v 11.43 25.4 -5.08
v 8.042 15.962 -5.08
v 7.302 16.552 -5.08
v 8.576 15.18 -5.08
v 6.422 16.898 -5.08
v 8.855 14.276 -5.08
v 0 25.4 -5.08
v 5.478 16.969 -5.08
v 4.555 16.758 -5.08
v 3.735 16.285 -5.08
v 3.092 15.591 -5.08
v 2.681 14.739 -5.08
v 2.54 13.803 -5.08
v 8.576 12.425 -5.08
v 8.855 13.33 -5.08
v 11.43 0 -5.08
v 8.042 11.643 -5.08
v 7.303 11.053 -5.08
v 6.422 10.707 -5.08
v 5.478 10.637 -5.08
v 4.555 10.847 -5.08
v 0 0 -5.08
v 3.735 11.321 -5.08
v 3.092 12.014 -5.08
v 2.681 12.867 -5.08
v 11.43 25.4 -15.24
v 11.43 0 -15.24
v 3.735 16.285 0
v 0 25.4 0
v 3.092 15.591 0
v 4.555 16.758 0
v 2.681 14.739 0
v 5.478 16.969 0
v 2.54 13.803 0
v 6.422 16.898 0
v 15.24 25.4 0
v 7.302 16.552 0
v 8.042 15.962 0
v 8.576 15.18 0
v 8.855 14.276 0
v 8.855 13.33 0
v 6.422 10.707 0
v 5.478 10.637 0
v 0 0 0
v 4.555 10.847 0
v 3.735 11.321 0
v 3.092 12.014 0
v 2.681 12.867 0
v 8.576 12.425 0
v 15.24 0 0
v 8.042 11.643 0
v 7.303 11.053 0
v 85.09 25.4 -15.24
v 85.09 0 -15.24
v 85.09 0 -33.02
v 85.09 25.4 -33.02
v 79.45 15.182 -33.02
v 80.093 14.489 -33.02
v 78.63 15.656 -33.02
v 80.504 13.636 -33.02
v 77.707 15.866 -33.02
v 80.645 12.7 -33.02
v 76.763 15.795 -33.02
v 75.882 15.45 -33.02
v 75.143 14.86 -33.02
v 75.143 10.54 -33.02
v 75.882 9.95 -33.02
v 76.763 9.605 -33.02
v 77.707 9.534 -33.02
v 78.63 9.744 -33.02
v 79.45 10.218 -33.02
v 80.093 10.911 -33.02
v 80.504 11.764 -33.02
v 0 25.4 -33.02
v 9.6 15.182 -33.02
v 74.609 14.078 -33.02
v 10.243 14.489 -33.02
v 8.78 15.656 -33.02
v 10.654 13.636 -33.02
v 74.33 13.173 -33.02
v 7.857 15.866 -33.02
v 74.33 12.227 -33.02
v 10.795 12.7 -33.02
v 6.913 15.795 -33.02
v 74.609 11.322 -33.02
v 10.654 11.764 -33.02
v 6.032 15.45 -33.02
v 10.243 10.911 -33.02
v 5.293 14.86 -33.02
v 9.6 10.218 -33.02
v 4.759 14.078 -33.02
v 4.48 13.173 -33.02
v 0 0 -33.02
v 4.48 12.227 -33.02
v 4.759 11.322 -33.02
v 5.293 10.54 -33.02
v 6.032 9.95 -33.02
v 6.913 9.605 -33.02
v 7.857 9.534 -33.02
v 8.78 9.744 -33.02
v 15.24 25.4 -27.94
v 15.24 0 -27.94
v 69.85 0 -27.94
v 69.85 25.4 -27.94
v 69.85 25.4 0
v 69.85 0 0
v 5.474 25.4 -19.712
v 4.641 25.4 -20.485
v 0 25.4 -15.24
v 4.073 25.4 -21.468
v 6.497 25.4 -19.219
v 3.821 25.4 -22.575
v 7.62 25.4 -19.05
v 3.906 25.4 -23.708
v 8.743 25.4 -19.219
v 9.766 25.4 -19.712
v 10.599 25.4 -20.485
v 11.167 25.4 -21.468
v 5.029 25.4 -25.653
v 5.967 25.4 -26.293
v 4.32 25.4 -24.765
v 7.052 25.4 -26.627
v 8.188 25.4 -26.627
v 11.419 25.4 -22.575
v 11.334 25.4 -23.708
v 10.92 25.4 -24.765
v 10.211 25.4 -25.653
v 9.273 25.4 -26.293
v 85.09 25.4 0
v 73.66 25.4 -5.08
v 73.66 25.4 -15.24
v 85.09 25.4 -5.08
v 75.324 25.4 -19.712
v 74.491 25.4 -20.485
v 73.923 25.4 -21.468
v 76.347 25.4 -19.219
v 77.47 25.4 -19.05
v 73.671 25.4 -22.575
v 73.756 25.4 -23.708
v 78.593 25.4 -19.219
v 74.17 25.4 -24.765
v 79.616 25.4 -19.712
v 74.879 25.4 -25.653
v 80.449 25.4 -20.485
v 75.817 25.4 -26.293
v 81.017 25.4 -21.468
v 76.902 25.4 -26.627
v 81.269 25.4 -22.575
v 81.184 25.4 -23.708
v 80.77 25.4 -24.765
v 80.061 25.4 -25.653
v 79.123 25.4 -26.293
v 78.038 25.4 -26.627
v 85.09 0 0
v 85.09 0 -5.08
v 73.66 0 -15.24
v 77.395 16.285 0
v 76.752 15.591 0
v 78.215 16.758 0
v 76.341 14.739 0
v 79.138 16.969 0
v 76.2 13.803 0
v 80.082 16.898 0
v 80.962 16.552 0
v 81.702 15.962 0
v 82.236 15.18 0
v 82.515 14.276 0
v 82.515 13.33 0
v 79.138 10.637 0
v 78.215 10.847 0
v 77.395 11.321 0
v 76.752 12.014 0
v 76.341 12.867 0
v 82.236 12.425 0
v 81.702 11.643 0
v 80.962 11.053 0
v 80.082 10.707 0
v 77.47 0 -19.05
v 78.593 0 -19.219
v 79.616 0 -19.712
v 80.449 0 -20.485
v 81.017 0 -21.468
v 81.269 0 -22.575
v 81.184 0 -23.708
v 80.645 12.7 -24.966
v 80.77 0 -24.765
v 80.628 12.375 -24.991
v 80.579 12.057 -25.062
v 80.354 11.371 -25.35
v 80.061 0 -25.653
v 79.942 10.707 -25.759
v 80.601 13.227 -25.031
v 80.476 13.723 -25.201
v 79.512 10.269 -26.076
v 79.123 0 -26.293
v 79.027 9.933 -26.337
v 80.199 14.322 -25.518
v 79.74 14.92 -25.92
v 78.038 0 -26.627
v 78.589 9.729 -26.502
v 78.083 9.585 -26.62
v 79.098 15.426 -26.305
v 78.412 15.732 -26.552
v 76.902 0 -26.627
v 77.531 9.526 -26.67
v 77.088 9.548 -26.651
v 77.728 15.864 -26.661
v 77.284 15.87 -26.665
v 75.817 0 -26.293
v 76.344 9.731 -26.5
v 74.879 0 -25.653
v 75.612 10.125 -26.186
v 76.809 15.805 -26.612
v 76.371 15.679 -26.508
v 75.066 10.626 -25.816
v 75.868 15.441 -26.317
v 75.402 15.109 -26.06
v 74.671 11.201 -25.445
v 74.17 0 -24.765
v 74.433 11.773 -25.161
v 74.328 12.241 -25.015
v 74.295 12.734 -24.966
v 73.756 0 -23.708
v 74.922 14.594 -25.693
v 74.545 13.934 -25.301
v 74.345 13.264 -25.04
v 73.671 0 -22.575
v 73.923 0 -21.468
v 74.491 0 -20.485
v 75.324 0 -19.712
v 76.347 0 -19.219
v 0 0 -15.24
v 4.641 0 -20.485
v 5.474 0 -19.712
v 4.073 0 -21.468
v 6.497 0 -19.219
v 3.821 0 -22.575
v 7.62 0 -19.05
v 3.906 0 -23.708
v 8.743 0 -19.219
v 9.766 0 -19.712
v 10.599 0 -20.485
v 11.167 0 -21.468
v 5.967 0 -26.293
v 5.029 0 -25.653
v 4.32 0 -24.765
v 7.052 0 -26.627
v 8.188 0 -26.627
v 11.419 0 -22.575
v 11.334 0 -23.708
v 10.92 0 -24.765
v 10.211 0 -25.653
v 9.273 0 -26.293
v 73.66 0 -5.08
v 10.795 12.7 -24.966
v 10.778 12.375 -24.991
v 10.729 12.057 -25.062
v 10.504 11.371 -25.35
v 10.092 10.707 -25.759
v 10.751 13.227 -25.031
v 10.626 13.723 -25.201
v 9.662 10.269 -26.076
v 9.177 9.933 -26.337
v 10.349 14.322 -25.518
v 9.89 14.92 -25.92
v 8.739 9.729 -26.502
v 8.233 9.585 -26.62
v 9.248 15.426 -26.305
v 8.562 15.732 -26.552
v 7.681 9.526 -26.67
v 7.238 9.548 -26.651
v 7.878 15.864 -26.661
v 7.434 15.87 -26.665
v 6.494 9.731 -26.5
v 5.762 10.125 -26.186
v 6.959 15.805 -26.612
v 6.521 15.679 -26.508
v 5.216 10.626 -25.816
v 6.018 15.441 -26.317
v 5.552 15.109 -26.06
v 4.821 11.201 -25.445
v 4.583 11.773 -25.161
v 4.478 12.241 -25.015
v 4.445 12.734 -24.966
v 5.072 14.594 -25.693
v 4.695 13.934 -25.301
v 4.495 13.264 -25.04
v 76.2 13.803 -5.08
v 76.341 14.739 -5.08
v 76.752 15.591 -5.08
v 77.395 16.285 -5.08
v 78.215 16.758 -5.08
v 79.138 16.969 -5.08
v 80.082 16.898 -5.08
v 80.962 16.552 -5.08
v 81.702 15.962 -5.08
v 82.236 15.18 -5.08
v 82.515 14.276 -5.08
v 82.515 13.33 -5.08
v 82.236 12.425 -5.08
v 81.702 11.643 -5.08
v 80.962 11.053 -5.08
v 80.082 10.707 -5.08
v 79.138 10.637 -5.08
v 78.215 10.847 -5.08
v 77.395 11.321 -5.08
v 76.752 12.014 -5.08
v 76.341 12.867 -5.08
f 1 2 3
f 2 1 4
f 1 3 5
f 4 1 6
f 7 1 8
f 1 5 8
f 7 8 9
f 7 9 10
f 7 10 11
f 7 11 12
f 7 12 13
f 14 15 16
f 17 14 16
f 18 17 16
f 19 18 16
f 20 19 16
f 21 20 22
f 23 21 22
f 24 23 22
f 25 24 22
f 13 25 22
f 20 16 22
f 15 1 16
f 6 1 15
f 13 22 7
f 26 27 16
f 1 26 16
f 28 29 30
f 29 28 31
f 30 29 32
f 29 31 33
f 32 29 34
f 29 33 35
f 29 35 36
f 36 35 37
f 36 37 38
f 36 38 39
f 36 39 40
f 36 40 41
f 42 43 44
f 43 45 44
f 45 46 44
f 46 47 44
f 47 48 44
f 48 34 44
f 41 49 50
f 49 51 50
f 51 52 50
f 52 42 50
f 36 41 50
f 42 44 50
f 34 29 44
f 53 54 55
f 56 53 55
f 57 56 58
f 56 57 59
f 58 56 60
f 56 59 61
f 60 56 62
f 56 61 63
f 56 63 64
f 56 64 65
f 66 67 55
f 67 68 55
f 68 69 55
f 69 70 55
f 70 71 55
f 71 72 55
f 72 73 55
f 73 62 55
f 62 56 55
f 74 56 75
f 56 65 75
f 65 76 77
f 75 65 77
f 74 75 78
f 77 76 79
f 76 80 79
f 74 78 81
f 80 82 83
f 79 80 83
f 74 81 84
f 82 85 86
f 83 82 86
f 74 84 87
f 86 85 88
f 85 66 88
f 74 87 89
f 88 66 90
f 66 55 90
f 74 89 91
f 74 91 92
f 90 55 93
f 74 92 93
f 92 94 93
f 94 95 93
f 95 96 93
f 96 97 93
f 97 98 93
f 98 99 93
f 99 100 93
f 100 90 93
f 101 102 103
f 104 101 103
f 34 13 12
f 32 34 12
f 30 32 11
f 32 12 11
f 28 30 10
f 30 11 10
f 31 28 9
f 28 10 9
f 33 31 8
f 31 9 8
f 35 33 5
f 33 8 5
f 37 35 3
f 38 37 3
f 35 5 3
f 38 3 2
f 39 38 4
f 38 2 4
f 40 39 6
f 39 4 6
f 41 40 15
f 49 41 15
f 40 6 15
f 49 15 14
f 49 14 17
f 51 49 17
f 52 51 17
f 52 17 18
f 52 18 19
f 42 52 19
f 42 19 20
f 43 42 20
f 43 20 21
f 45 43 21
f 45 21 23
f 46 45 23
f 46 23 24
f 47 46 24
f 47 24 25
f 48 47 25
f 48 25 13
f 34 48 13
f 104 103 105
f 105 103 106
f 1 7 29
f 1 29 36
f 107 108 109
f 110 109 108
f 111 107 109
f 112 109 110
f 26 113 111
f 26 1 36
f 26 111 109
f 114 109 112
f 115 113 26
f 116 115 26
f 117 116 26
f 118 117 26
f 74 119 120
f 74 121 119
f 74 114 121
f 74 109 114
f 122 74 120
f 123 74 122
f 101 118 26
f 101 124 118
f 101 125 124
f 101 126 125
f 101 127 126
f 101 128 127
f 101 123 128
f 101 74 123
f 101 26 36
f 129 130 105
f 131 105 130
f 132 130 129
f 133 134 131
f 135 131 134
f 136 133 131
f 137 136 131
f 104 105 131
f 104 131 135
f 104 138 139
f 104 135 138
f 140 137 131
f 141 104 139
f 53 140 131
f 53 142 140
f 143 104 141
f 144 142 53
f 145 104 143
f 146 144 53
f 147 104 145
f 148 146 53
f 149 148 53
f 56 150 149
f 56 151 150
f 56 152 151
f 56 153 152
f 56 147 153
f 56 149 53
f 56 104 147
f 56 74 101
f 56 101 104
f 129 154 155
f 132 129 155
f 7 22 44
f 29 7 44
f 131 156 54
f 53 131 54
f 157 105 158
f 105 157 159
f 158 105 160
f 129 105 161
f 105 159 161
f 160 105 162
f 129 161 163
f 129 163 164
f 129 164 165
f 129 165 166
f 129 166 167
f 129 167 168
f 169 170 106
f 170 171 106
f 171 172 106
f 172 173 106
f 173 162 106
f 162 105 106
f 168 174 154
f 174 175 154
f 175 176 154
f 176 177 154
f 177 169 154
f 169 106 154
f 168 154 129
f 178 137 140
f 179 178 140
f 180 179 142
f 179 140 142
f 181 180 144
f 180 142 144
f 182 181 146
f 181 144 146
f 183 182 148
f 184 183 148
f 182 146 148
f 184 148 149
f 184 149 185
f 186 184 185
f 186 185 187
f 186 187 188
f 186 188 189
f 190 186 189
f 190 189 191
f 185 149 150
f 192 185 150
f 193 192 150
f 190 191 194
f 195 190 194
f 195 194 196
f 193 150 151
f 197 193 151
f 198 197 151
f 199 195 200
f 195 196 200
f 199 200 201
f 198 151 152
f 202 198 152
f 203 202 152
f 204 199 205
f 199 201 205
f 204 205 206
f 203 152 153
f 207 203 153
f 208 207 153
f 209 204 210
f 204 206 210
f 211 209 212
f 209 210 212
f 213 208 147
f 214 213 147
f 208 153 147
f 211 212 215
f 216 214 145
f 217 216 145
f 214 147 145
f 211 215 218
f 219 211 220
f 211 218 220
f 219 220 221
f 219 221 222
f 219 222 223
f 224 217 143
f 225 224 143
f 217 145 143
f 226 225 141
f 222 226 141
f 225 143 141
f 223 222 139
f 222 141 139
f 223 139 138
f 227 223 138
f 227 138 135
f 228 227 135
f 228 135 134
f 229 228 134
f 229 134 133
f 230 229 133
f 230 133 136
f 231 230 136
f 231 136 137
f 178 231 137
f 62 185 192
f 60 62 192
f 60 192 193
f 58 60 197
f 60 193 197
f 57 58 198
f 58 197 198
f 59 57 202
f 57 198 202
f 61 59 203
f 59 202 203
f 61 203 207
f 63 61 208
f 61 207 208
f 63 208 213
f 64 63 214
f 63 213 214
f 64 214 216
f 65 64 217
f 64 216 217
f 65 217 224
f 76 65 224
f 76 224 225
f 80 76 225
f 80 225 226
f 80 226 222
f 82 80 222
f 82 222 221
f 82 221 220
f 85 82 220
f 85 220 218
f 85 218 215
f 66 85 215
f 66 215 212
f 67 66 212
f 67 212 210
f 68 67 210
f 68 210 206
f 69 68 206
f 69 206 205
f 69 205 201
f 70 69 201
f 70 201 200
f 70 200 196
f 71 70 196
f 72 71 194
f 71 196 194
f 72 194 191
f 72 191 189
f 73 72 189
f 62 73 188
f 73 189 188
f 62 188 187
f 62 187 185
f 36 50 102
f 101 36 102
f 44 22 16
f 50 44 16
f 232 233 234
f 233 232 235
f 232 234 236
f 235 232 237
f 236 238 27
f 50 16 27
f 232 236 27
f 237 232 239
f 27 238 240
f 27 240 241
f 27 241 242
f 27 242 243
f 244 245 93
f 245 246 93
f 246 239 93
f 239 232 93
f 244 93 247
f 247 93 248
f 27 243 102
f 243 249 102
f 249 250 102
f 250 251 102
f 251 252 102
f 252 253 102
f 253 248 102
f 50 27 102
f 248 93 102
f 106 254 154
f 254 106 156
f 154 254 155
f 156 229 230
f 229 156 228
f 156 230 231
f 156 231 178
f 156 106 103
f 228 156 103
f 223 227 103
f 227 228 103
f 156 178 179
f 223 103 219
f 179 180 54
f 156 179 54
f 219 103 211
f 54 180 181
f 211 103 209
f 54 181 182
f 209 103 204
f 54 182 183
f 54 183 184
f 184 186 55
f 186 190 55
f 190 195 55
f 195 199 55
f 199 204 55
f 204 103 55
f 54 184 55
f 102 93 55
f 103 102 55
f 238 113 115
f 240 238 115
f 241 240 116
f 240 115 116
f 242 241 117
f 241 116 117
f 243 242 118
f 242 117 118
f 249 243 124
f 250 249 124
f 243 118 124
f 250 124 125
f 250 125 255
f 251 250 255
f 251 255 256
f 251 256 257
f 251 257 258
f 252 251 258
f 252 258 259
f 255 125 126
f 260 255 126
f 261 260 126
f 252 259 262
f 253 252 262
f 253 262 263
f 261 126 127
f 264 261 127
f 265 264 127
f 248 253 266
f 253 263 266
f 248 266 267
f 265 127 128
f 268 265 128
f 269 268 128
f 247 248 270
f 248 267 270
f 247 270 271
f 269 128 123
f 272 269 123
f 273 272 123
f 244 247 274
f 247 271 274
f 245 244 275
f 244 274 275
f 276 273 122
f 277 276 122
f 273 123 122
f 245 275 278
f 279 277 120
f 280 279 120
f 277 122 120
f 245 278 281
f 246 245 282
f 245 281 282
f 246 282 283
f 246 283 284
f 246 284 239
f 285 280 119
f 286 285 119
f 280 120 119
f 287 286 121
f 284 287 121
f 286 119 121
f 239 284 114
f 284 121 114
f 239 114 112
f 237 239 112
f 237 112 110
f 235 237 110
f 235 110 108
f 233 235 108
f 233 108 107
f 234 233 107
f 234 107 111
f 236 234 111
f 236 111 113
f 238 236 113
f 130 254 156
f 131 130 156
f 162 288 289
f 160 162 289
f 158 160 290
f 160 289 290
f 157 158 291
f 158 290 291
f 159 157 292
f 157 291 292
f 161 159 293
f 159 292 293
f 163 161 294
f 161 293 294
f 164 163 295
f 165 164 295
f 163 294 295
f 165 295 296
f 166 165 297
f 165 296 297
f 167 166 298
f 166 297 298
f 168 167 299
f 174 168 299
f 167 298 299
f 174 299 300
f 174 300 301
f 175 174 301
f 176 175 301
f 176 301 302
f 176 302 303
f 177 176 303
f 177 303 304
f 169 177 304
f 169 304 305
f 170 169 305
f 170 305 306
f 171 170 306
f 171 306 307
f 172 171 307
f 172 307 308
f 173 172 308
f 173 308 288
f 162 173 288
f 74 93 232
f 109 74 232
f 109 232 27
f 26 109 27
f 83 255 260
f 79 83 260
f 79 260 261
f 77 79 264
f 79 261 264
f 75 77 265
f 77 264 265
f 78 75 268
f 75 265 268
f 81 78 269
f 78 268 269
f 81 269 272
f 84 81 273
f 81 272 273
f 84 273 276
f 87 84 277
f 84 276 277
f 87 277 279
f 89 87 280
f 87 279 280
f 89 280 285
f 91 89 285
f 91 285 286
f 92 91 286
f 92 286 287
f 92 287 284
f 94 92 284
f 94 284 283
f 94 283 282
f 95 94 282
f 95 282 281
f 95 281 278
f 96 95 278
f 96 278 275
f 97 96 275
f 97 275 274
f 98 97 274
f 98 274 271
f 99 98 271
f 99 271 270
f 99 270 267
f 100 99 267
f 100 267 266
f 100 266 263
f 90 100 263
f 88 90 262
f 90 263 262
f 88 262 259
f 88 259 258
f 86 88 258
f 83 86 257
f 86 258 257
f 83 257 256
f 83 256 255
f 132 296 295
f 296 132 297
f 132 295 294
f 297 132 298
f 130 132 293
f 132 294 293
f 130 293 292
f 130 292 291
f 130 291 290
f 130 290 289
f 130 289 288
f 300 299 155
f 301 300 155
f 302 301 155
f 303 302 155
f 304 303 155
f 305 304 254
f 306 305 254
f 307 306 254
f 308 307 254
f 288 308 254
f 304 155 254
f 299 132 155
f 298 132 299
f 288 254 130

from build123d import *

# Parameters (mm, degrees)
BOSS_EXTRUDE1_DEPTH             = 25.4
SKETCH2_R                       = 3.81
CUT_EXTRUDE1_DEPTH              = 95.74063806
F_1_4_0_25_DIAMETER_HOLE1_D     = 6.35
F_1_4_0_25_DIAMETER_HOLE1_DEPTH = 7.62
F_1_4_0_25_DIAMETER_HOLE1_TIP   = 1.907732465
F_1_4_0_25_DIAMETER_HOLE2_D     = 6.35
F_1_4_0_25_DIAMETER_HOLE2_DEPTH = 10.16
F_1_4_0_25_DIAMETER_HOLE2_TIP   = 1.907732465


with BuildPart() as part:
    # Sketch1 → Boss-Extrude1 (new body)
    with BuildSketch(Plane(origin=(0, 0, 0), x_dir=(1, 0, 0), z_dir=(0, 1, 0))):
        Polygon((69.85, 0), (85.09, 0), (85.09, 5.08), (73.66, 5.08), (73.66, 15.24), (85.09, 15.24), (85.09, 33.02), (0, 33.02), (0, 15.24), (11.43, 15.24), (11.43, 5.08), (0, 5.08), (0, 0), (15.24, 0), (15.24, 27.94), (69.85, 27.94), align=None)
    extrude(amount=BOSS_EXTRUDE1_DEPTH)

    # Sketch2 → Cut-Extrude1 (cut, through all)
    with BuildSketch(Plane(origin=(0, 25.4, 0), x_dir=(1, 0, 0), z_dir=(0, 1, 0))):
        with Locations(Location((7.62, 22.86, 0), (0, 0, 270))):
            Circle(SKETCH2_R)
        with Locations(Location((77.47, 22.86, 0), (0, 0, 270))):
            Circle(SKETCH2_R)
    extrude(amount=-CUT_EXTRUDE1_DEPTH, mode=Mode.SUBTRACT)

    # 1/4 (0.25) Diameter Hole1
    with Locations(Plane.XY):
        with Locations((5.715, 13.802822473), (79.375, 13.802822473)):
            Hole(F_1_4_0_25_DIAMETER_HOLE1_D / 2, depth=F_1_4_0_25_DIAMETER_HOLE1_DEPTH)
            with Locations((0, 0, -(F_1_4_0_25_DIAMETER_HOLE1_DEPTH + F_1_4_0_25_DIAMETER_HOLE1_TIP / 2))):  # 118° drill point
                Cone(0, F_1_4_0_25_DIAMETER_HOLE1_D / 2, F_1_4_0_25_DIAMETER_HOLE1_TIP, mode=Mode.SUBTRACT)

    # 1/4 (0.25) Diameter Hole2
    with Locations(Plane(origin=(0, 0, -33.02), x_dir=(-1, 0, 0), z_dir=(0, 0, -1))):
        with Locations((-77.47, 12.7), (-7.62, 12.7)):
            Hole(F_1_4_0_25_DIAMETER_HOLE2_D / 2, depth=F_1_4_0_25_DIAMETER_HOLE2_DEPTH)
            with Locations((0, 0, -(F_1_4_0_25_DIAMETER_HOLE2_DEPTH + F_1_4_0_25_DIAMETER_HOLE2_TIP / 2))):  # 118° drill point
                Cone(0, F_1_4_0_25_DIAMETER_HOLE2_D / 2, F_1_4_0_25_DIAMETER_HOLE2_TIP, mode=Mode.SUBTRACT)


solid = part.part
